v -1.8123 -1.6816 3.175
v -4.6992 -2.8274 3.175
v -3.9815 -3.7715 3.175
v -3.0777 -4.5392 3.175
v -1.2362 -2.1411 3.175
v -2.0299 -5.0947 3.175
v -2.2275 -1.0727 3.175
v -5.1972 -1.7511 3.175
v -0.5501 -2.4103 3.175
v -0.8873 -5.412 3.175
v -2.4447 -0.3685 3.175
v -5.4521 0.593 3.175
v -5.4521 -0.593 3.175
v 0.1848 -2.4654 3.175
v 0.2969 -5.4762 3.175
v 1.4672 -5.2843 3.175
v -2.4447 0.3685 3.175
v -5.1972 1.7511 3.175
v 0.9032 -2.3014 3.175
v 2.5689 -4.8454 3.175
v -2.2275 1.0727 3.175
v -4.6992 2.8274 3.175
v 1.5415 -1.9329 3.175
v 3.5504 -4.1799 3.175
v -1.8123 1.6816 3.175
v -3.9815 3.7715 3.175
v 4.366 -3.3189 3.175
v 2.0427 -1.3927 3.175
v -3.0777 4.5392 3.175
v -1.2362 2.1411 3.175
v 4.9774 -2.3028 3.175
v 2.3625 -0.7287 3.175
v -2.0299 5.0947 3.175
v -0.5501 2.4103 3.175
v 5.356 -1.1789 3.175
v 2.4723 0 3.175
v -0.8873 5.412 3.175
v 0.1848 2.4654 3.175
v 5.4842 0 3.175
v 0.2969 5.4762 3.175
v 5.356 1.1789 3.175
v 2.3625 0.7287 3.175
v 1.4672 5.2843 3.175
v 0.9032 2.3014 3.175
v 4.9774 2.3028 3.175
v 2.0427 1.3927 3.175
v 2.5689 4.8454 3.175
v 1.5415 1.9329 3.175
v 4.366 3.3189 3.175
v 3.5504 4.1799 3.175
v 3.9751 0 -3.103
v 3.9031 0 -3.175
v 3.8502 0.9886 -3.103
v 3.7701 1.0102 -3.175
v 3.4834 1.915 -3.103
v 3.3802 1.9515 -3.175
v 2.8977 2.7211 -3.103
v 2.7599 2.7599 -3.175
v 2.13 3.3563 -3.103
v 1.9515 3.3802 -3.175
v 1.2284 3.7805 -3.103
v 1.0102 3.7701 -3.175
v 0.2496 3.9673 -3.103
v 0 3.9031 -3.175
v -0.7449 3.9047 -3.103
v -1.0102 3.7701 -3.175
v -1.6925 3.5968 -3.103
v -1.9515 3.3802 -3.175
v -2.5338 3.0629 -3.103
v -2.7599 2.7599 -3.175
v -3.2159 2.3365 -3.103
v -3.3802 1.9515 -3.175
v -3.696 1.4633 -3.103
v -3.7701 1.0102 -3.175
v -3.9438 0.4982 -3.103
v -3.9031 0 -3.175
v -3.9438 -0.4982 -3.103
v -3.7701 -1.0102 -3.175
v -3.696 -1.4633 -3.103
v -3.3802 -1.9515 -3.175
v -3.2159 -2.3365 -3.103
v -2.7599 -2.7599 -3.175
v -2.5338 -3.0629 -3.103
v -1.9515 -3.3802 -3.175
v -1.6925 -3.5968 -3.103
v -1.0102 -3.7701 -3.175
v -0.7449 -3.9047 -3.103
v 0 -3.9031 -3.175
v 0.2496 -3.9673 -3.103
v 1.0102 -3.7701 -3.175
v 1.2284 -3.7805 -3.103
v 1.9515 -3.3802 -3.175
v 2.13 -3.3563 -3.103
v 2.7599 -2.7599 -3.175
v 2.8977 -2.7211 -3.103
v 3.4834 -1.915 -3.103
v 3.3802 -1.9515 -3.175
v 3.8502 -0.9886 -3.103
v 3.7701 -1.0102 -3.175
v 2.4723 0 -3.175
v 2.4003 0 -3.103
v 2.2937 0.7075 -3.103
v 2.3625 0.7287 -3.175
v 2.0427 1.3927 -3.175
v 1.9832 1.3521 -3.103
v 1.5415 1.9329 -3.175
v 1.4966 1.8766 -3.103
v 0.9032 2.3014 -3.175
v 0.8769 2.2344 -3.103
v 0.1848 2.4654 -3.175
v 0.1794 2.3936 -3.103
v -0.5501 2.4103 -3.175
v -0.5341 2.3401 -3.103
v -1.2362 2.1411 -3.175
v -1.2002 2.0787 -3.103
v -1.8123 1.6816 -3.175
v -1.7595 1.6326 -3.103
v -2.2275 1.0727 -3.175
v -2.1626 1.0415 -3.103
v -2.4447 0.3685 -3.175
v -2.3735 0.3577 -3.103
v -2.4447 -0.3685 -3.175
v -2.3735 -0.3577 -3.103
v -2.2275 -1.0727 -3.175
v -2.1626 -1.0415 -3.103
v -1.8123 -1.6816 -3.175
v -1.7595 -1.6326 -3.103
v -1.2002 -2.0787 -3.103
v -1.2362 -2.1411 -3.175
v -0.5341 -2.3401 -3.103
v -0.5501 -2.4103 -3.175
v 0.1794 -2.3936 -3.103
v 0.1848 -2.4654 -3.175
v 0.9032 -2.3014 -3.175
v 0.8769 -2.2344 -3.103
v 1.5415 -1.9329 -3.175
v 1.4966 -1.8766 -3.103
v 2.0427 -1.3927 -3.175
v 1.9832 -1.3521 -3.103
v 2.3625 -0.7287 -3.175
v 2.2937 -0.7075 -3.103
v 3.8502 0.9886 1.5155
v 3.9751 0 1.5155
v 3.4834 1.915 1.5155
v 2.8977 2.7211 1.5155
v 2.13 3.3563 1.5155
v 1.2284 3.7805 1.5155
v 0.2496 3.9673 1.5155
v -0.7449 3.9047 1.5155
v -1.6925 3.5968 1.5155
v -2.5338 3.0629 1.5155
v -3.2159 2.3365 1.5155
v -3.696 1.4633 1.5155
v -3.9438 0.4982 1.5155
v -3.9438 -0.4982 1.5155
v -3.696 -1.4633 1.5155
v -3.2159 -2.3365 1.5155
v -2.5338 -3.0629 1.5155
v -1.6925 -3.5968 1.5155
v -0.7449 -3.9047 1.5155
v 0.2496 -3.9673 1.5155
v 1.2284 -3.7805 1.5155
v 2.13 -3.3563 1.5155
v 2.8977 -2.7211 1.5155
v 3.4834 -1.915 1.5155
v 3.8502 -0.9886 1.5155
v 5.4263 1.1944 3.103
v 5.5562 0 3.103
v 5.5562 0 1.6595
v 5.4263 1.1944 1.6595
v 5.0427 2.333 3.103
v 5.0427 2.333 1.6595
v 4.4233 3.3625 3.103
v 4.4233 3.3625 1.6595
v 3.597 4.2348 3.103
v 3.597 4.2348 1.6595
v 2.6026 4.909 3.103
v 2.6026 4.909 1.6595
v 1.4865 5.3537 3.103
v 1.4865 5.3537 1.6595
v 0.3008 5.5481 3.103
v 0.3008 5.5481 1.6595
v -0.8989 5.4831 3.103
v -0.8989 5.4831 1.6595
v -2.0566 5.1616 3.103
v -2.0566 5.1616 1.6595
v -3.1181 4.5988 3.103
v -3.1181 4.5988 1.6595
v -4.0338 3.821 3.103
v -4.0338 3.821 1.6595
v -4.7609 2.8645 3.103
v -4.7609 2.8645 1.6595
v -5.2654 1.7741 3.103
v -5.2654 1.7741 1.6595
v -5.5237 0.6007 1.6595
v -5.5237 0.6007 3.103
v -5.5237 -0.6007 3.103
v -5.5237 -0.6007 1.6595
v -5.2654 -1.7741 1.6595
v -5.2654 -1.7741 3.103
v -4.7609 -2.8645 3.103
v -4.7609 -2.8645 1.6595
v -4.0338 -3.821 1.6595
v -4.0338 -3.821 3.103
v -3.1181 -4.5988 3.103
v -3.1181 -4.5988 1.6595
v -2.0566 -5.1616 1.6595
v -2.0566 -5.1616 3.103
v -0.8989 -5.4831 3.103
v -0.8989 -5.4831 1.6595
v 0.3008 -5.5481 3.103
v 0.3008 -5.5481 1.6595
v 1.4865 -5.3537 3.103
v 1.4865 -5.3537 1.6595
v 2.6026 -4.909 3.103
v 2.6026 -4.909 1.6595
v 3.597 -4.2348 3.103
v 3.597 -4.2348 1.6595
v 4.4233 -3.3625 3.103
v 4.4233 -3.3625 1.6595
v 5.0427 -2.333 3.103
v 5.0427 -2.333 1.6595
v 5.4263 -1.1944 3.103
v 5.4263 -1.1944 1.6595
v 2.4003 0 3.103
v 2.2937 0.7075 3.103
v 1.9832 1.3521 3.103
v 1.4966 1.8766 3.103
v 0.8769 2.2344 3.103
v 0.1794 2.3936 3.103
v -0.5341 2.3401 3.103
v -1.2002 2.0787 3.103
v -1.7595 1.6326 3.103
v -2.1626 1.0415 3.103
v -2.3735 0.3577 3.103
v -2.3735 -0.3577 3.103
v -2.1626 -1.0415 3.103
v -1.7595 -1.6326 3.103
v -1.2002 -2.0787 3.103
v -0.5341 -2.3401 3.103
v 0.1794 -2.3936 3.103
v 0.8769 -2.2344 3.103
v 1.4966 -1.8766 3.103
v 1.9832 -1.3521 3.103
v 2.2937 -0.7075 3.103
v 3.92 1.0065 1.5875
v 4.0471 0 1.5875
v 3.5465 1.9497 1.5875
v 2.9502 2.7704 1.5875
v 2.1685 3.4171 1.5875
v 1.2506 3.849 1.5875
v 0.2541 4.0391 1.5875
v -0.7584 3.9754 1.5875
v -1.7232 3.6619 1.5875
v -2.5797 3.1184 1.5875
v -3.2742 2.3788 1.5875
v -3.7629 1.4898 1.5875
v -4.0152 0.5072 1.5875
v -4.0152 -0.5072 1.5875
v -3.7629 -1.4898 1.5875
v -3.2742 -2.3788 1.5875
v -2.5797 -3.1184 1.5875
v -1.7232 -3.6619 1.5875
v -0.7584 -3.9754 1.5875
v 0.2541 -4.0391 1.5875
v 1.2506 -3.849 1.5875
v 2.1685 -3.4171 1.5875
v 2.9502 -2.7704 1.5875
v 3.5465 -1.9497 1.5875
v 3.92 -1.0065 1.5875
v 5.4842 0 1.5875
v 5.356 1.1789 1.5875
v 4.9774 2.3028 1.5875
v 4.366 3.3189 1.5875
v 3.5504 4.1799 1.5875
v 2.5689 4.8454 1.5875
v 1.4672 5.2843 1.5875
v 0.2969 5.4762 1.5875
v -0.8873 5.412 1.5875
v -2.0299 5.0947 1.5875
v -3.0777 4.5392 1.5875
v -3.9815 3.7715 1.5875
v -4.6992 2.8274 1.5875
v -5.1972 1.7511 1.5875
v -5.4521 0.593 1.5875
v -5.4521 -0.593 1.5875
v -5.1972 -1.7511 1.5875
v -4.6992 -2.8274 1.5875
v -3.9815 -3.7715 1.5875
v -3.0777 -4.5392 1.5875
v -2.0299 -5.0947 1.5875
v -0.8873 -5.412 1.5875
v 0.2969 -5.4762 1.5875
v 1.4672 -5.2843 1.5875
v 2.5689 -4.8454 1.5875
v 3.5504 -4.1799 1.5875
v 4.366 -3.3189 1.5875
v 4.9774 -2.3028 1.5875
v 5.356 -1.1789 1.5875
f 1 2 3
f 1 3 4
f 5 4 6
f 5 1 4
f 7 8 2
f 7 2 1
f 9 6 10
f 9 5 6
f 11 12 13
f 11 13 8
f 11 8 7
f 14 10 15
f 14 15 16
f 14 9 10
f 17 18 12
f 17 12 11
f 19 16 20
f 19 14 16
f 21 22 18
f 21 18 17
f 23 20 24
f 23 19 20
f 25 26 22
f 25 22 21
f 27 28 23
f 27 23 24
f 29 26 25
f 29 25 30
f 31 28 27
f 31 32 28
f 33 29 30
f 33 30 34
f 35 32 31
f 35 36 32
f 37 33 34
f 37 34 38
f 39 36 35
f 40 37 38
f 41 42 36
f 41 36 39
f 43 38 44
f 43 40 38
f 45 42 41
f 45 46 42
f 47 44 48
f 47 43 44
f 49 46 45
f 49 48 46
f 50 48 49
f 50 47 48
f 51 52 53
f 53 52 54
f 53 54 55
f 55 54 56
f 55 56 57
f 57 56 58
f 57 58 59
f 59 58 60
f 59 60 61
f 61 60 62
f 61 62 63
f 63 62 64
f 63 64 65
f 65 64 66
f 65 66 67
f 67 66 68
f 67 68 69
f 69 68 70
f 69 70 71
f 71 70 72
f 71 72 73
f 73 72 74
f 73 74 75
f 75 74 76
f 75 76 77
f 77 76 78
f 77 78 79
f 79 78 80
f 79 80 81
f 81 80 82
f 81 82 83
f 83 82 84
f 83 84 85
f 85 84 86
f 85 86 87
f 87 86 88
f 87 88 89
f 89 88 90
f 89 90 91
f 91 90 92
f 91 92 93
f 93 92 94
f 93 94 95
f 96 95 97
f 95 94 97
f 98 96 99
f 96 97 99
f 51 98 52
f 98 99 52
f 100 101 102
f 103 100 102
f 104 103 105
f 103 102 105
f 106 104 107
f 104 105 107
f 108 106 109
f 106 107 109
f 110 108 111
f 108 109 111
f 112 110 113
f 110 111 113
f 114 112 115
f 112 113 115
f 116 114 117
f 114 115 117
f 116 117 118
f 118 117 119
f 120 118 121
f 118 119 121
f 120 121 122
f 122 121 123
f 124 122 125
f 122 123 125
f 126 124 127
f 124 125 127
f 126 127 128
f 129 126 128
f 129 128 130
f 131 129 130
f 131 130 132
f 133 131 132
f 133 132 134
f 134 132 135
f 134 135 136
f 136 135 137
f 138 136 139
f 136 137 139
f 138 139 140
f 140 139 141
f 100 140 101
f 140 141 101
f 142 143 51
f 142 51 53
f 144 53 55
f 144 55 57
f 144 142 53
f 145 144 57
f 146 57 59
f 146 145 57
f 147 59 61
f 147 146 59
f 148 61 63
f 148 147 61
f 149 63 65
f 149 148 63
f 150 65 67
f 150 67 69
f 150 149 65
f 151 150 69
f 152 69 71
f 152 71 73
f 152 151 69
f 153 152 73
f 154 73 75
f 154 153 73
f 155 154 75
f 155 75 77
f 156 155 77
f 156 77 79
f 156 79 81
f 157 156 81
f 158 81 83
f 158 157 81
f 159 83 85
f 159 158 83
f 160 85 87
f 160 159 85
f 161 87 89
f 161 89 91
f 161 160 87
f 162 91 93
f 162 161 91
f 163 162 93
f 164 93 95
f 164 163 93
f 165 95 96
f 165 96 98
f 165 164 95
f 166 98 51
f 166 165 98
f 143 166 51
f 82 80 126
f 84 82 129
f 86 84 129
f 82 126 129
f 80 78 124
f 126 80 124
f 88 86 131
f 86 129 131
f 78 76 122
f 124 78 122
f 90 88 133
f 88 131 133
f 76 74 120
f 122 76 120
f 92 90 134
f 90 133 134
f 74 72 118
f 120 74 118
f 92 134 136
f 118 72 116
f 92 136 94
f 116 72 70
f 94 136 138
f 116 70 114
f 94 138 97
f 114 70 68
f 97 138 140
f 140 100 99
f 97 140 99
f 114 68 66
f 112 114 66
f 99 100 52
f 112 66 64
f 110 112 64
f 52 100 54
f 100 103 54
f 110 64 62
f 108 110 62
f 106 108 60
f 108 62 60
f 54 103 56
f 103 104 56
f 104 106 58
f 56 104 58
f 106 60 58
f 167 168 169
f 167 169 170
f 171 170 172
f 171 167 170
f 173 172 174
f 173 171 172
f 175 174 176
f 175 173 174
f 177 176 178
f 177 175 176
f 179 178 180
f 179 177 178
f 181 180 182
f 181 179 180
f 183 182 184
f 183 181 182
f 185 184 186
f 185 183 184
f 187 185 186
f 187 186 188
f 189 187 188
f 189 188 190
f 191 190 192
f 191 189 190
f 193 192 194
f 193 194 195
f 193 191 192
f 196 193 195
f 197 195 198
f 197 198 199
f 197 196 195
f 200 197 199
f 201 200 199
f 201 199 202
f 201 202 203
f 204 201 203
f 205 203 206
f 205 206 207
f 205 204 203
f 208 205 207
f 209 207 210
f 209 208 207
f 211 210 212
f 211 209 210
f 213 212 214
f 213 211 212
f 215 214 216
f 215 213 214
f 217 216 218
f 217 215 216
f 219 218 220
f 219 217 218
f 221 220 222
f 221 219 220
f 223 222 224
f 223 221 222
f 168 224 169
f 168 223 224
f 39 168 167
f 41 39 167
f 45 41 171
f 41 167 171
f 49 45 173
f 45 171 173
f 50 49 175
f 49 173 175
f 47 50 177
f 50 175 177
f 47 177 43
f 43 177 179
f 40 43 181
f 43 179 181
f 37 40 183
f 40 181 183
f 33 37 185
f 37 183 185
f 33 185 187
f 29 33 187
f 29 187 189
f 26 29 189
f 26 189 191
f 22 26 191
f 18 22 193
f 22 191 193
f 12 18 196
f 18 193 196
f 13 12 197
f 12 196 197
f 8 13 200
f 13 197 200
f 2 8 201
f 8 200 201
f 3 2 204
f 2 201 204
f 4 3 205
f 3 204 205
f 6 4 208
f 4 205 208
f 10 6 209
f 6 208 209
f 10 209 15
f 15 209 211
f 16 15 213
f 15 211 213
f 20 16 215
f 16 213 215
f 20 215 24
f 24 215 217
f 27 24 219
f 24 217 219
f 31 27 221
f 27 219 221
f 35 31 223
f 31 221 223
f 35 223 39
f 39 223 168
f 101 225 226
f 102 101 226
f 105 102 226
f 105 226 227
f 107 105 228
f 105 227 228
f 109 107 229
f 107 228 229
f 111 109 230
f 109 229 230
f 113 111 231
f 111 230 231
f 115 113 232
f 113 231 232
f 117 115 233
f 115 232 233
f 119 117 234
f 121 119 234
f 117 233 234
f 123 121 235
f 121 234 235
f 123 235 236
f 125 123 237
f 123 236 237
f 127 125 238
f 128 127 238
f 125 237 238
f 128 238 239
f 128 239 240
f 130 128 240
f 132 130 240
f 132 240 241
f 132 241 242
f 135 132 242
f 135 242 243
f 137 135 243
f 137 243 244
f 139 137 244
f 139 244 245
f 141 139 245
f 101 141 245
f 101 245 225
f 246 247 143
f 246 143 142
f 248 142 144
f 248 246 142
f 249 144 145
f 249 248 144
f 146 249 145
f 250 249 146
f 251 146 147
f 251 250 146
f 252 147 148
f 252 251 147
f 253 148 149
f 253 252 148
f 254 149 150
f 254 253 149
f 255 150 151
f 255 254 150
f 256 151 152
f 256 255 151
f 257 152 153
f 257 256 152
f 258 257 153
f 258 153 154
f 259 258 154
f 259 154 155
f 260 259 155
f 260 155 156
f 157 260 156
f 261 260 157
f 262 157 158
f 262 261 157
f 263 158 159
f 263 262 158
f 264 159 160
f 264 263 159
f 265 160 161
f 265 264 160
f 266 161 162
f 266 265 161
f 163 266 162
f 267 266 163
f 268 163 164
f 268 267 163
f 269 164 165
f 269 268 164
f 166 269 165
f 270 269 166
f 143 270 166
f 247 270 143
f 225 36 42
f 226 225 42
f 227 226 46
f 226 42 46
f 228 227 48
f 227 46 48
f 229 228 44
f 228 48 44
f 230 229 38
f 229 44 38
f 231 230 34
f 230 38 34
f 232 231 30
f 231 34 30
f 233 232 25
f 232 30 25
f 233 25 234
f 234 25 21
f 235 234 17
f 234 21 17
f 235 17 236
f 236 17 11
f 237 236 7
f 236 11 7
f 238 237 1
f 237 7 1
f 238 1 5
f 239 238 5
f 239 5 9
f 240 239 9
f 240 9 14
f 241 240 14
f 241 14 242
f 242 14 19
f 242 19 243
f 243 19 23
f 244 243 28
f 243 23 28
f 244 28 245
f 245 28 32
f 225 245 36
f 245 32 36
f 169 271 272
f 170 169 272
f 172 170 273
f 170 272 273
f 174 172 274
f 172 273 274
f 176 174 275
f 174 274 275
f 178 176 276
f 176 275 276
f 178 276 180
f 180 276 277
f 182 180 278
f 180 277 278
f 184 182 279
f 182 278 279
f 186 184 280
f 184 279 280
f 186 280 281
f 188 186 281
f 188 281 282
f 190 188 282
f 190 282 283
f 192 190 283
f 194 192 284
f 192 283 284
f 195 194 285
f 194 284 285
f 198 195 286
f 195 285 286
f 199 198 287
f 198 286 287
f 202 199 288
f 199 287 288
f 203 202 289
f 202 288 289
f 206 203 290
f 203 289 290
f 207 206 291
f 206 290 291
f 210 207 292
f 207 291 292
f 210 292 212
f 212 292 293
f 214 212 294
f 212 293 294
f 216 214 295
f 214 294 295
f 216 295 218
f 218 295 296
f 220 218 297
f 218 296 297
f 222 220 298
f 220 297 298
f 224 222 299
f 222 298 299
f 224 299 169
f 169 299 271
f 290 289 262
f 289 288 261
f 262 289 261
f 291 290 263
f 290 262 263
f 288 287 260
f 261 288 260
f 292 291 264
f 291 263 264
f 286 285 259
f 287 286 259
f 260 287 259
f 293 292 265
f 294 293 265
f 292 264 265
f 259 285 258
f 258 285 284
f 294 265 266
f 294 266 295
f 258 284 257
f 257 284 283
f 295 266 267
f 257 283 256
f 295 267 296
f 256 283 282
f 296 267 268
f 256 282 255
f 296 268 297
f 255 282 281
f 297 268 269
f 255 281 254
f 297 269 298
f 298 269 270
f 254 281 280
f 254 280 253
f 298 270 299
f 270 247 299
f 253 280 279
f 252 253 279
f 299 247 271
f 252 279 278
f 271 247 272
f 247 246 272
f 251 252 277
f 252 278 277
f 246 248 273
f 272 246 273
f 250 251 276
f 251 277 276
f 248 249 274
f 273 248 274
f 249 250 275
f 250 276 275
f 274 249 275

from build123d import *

# Parameters (mm, degrees)
BOSS_EXTRUDE1_START = 3.175
SKETCH3_R           = 5.55625
SKETCH3_R_2         = 2.4003
BOSS_EXTRUDE1_DEPTH = 1.5875
BOSS_EXTRUDE2_START = 1.5875
SKETCH4_R           = 3.9751
SKETCH4_R_2         = 2.4003
BOSS_EXTRUDE2_DEPTH = 4.7625
CHAMFER1_SIZE       = 0.072009


with BuildPart() as part:
    # Sketch3 → Boss-Extrude1 (new body)
    with BuildSketch(Plane.XY.offset(BOSS_EXTRUDE1_START)):
        Circle(SKETCH3_R)
        Circle(SKETCH3_R_2, mode=Mode.SUBTRACT)
    extrude(amount=-BOSS_EXTRUDE1_DEPTH)

    # Sketch4 → Boss-Extrude2 (add)
    with BuildSketch(Plane.XY.offset(BOSS_EXTRUDE2_START)):
        Circle(SKETCH4_R)
        Circle(SKETCH4_R_2, mode=Mode.SUBTRACT)
    extrude(amount=-BOSS_EXTRUDE2_DEPTH)

    # Chamfer1
    chamfer1_edges = [part.edges().sort_by_distance(p)[0] for p in [
        (-2.4003, 0, -3.175),
        (-3.9751, 0, 1.5875),
        (-5.55625, 0, 3.175),
        (-5.55625, 0, 1.5875),
        (-2.4003, 0, 3.175),
        (-3.9751, 0, -3.175),
    ]]
    chamfer(chamfer1_edges, length=CHAMFER1_SIZE)


solid = part.part
